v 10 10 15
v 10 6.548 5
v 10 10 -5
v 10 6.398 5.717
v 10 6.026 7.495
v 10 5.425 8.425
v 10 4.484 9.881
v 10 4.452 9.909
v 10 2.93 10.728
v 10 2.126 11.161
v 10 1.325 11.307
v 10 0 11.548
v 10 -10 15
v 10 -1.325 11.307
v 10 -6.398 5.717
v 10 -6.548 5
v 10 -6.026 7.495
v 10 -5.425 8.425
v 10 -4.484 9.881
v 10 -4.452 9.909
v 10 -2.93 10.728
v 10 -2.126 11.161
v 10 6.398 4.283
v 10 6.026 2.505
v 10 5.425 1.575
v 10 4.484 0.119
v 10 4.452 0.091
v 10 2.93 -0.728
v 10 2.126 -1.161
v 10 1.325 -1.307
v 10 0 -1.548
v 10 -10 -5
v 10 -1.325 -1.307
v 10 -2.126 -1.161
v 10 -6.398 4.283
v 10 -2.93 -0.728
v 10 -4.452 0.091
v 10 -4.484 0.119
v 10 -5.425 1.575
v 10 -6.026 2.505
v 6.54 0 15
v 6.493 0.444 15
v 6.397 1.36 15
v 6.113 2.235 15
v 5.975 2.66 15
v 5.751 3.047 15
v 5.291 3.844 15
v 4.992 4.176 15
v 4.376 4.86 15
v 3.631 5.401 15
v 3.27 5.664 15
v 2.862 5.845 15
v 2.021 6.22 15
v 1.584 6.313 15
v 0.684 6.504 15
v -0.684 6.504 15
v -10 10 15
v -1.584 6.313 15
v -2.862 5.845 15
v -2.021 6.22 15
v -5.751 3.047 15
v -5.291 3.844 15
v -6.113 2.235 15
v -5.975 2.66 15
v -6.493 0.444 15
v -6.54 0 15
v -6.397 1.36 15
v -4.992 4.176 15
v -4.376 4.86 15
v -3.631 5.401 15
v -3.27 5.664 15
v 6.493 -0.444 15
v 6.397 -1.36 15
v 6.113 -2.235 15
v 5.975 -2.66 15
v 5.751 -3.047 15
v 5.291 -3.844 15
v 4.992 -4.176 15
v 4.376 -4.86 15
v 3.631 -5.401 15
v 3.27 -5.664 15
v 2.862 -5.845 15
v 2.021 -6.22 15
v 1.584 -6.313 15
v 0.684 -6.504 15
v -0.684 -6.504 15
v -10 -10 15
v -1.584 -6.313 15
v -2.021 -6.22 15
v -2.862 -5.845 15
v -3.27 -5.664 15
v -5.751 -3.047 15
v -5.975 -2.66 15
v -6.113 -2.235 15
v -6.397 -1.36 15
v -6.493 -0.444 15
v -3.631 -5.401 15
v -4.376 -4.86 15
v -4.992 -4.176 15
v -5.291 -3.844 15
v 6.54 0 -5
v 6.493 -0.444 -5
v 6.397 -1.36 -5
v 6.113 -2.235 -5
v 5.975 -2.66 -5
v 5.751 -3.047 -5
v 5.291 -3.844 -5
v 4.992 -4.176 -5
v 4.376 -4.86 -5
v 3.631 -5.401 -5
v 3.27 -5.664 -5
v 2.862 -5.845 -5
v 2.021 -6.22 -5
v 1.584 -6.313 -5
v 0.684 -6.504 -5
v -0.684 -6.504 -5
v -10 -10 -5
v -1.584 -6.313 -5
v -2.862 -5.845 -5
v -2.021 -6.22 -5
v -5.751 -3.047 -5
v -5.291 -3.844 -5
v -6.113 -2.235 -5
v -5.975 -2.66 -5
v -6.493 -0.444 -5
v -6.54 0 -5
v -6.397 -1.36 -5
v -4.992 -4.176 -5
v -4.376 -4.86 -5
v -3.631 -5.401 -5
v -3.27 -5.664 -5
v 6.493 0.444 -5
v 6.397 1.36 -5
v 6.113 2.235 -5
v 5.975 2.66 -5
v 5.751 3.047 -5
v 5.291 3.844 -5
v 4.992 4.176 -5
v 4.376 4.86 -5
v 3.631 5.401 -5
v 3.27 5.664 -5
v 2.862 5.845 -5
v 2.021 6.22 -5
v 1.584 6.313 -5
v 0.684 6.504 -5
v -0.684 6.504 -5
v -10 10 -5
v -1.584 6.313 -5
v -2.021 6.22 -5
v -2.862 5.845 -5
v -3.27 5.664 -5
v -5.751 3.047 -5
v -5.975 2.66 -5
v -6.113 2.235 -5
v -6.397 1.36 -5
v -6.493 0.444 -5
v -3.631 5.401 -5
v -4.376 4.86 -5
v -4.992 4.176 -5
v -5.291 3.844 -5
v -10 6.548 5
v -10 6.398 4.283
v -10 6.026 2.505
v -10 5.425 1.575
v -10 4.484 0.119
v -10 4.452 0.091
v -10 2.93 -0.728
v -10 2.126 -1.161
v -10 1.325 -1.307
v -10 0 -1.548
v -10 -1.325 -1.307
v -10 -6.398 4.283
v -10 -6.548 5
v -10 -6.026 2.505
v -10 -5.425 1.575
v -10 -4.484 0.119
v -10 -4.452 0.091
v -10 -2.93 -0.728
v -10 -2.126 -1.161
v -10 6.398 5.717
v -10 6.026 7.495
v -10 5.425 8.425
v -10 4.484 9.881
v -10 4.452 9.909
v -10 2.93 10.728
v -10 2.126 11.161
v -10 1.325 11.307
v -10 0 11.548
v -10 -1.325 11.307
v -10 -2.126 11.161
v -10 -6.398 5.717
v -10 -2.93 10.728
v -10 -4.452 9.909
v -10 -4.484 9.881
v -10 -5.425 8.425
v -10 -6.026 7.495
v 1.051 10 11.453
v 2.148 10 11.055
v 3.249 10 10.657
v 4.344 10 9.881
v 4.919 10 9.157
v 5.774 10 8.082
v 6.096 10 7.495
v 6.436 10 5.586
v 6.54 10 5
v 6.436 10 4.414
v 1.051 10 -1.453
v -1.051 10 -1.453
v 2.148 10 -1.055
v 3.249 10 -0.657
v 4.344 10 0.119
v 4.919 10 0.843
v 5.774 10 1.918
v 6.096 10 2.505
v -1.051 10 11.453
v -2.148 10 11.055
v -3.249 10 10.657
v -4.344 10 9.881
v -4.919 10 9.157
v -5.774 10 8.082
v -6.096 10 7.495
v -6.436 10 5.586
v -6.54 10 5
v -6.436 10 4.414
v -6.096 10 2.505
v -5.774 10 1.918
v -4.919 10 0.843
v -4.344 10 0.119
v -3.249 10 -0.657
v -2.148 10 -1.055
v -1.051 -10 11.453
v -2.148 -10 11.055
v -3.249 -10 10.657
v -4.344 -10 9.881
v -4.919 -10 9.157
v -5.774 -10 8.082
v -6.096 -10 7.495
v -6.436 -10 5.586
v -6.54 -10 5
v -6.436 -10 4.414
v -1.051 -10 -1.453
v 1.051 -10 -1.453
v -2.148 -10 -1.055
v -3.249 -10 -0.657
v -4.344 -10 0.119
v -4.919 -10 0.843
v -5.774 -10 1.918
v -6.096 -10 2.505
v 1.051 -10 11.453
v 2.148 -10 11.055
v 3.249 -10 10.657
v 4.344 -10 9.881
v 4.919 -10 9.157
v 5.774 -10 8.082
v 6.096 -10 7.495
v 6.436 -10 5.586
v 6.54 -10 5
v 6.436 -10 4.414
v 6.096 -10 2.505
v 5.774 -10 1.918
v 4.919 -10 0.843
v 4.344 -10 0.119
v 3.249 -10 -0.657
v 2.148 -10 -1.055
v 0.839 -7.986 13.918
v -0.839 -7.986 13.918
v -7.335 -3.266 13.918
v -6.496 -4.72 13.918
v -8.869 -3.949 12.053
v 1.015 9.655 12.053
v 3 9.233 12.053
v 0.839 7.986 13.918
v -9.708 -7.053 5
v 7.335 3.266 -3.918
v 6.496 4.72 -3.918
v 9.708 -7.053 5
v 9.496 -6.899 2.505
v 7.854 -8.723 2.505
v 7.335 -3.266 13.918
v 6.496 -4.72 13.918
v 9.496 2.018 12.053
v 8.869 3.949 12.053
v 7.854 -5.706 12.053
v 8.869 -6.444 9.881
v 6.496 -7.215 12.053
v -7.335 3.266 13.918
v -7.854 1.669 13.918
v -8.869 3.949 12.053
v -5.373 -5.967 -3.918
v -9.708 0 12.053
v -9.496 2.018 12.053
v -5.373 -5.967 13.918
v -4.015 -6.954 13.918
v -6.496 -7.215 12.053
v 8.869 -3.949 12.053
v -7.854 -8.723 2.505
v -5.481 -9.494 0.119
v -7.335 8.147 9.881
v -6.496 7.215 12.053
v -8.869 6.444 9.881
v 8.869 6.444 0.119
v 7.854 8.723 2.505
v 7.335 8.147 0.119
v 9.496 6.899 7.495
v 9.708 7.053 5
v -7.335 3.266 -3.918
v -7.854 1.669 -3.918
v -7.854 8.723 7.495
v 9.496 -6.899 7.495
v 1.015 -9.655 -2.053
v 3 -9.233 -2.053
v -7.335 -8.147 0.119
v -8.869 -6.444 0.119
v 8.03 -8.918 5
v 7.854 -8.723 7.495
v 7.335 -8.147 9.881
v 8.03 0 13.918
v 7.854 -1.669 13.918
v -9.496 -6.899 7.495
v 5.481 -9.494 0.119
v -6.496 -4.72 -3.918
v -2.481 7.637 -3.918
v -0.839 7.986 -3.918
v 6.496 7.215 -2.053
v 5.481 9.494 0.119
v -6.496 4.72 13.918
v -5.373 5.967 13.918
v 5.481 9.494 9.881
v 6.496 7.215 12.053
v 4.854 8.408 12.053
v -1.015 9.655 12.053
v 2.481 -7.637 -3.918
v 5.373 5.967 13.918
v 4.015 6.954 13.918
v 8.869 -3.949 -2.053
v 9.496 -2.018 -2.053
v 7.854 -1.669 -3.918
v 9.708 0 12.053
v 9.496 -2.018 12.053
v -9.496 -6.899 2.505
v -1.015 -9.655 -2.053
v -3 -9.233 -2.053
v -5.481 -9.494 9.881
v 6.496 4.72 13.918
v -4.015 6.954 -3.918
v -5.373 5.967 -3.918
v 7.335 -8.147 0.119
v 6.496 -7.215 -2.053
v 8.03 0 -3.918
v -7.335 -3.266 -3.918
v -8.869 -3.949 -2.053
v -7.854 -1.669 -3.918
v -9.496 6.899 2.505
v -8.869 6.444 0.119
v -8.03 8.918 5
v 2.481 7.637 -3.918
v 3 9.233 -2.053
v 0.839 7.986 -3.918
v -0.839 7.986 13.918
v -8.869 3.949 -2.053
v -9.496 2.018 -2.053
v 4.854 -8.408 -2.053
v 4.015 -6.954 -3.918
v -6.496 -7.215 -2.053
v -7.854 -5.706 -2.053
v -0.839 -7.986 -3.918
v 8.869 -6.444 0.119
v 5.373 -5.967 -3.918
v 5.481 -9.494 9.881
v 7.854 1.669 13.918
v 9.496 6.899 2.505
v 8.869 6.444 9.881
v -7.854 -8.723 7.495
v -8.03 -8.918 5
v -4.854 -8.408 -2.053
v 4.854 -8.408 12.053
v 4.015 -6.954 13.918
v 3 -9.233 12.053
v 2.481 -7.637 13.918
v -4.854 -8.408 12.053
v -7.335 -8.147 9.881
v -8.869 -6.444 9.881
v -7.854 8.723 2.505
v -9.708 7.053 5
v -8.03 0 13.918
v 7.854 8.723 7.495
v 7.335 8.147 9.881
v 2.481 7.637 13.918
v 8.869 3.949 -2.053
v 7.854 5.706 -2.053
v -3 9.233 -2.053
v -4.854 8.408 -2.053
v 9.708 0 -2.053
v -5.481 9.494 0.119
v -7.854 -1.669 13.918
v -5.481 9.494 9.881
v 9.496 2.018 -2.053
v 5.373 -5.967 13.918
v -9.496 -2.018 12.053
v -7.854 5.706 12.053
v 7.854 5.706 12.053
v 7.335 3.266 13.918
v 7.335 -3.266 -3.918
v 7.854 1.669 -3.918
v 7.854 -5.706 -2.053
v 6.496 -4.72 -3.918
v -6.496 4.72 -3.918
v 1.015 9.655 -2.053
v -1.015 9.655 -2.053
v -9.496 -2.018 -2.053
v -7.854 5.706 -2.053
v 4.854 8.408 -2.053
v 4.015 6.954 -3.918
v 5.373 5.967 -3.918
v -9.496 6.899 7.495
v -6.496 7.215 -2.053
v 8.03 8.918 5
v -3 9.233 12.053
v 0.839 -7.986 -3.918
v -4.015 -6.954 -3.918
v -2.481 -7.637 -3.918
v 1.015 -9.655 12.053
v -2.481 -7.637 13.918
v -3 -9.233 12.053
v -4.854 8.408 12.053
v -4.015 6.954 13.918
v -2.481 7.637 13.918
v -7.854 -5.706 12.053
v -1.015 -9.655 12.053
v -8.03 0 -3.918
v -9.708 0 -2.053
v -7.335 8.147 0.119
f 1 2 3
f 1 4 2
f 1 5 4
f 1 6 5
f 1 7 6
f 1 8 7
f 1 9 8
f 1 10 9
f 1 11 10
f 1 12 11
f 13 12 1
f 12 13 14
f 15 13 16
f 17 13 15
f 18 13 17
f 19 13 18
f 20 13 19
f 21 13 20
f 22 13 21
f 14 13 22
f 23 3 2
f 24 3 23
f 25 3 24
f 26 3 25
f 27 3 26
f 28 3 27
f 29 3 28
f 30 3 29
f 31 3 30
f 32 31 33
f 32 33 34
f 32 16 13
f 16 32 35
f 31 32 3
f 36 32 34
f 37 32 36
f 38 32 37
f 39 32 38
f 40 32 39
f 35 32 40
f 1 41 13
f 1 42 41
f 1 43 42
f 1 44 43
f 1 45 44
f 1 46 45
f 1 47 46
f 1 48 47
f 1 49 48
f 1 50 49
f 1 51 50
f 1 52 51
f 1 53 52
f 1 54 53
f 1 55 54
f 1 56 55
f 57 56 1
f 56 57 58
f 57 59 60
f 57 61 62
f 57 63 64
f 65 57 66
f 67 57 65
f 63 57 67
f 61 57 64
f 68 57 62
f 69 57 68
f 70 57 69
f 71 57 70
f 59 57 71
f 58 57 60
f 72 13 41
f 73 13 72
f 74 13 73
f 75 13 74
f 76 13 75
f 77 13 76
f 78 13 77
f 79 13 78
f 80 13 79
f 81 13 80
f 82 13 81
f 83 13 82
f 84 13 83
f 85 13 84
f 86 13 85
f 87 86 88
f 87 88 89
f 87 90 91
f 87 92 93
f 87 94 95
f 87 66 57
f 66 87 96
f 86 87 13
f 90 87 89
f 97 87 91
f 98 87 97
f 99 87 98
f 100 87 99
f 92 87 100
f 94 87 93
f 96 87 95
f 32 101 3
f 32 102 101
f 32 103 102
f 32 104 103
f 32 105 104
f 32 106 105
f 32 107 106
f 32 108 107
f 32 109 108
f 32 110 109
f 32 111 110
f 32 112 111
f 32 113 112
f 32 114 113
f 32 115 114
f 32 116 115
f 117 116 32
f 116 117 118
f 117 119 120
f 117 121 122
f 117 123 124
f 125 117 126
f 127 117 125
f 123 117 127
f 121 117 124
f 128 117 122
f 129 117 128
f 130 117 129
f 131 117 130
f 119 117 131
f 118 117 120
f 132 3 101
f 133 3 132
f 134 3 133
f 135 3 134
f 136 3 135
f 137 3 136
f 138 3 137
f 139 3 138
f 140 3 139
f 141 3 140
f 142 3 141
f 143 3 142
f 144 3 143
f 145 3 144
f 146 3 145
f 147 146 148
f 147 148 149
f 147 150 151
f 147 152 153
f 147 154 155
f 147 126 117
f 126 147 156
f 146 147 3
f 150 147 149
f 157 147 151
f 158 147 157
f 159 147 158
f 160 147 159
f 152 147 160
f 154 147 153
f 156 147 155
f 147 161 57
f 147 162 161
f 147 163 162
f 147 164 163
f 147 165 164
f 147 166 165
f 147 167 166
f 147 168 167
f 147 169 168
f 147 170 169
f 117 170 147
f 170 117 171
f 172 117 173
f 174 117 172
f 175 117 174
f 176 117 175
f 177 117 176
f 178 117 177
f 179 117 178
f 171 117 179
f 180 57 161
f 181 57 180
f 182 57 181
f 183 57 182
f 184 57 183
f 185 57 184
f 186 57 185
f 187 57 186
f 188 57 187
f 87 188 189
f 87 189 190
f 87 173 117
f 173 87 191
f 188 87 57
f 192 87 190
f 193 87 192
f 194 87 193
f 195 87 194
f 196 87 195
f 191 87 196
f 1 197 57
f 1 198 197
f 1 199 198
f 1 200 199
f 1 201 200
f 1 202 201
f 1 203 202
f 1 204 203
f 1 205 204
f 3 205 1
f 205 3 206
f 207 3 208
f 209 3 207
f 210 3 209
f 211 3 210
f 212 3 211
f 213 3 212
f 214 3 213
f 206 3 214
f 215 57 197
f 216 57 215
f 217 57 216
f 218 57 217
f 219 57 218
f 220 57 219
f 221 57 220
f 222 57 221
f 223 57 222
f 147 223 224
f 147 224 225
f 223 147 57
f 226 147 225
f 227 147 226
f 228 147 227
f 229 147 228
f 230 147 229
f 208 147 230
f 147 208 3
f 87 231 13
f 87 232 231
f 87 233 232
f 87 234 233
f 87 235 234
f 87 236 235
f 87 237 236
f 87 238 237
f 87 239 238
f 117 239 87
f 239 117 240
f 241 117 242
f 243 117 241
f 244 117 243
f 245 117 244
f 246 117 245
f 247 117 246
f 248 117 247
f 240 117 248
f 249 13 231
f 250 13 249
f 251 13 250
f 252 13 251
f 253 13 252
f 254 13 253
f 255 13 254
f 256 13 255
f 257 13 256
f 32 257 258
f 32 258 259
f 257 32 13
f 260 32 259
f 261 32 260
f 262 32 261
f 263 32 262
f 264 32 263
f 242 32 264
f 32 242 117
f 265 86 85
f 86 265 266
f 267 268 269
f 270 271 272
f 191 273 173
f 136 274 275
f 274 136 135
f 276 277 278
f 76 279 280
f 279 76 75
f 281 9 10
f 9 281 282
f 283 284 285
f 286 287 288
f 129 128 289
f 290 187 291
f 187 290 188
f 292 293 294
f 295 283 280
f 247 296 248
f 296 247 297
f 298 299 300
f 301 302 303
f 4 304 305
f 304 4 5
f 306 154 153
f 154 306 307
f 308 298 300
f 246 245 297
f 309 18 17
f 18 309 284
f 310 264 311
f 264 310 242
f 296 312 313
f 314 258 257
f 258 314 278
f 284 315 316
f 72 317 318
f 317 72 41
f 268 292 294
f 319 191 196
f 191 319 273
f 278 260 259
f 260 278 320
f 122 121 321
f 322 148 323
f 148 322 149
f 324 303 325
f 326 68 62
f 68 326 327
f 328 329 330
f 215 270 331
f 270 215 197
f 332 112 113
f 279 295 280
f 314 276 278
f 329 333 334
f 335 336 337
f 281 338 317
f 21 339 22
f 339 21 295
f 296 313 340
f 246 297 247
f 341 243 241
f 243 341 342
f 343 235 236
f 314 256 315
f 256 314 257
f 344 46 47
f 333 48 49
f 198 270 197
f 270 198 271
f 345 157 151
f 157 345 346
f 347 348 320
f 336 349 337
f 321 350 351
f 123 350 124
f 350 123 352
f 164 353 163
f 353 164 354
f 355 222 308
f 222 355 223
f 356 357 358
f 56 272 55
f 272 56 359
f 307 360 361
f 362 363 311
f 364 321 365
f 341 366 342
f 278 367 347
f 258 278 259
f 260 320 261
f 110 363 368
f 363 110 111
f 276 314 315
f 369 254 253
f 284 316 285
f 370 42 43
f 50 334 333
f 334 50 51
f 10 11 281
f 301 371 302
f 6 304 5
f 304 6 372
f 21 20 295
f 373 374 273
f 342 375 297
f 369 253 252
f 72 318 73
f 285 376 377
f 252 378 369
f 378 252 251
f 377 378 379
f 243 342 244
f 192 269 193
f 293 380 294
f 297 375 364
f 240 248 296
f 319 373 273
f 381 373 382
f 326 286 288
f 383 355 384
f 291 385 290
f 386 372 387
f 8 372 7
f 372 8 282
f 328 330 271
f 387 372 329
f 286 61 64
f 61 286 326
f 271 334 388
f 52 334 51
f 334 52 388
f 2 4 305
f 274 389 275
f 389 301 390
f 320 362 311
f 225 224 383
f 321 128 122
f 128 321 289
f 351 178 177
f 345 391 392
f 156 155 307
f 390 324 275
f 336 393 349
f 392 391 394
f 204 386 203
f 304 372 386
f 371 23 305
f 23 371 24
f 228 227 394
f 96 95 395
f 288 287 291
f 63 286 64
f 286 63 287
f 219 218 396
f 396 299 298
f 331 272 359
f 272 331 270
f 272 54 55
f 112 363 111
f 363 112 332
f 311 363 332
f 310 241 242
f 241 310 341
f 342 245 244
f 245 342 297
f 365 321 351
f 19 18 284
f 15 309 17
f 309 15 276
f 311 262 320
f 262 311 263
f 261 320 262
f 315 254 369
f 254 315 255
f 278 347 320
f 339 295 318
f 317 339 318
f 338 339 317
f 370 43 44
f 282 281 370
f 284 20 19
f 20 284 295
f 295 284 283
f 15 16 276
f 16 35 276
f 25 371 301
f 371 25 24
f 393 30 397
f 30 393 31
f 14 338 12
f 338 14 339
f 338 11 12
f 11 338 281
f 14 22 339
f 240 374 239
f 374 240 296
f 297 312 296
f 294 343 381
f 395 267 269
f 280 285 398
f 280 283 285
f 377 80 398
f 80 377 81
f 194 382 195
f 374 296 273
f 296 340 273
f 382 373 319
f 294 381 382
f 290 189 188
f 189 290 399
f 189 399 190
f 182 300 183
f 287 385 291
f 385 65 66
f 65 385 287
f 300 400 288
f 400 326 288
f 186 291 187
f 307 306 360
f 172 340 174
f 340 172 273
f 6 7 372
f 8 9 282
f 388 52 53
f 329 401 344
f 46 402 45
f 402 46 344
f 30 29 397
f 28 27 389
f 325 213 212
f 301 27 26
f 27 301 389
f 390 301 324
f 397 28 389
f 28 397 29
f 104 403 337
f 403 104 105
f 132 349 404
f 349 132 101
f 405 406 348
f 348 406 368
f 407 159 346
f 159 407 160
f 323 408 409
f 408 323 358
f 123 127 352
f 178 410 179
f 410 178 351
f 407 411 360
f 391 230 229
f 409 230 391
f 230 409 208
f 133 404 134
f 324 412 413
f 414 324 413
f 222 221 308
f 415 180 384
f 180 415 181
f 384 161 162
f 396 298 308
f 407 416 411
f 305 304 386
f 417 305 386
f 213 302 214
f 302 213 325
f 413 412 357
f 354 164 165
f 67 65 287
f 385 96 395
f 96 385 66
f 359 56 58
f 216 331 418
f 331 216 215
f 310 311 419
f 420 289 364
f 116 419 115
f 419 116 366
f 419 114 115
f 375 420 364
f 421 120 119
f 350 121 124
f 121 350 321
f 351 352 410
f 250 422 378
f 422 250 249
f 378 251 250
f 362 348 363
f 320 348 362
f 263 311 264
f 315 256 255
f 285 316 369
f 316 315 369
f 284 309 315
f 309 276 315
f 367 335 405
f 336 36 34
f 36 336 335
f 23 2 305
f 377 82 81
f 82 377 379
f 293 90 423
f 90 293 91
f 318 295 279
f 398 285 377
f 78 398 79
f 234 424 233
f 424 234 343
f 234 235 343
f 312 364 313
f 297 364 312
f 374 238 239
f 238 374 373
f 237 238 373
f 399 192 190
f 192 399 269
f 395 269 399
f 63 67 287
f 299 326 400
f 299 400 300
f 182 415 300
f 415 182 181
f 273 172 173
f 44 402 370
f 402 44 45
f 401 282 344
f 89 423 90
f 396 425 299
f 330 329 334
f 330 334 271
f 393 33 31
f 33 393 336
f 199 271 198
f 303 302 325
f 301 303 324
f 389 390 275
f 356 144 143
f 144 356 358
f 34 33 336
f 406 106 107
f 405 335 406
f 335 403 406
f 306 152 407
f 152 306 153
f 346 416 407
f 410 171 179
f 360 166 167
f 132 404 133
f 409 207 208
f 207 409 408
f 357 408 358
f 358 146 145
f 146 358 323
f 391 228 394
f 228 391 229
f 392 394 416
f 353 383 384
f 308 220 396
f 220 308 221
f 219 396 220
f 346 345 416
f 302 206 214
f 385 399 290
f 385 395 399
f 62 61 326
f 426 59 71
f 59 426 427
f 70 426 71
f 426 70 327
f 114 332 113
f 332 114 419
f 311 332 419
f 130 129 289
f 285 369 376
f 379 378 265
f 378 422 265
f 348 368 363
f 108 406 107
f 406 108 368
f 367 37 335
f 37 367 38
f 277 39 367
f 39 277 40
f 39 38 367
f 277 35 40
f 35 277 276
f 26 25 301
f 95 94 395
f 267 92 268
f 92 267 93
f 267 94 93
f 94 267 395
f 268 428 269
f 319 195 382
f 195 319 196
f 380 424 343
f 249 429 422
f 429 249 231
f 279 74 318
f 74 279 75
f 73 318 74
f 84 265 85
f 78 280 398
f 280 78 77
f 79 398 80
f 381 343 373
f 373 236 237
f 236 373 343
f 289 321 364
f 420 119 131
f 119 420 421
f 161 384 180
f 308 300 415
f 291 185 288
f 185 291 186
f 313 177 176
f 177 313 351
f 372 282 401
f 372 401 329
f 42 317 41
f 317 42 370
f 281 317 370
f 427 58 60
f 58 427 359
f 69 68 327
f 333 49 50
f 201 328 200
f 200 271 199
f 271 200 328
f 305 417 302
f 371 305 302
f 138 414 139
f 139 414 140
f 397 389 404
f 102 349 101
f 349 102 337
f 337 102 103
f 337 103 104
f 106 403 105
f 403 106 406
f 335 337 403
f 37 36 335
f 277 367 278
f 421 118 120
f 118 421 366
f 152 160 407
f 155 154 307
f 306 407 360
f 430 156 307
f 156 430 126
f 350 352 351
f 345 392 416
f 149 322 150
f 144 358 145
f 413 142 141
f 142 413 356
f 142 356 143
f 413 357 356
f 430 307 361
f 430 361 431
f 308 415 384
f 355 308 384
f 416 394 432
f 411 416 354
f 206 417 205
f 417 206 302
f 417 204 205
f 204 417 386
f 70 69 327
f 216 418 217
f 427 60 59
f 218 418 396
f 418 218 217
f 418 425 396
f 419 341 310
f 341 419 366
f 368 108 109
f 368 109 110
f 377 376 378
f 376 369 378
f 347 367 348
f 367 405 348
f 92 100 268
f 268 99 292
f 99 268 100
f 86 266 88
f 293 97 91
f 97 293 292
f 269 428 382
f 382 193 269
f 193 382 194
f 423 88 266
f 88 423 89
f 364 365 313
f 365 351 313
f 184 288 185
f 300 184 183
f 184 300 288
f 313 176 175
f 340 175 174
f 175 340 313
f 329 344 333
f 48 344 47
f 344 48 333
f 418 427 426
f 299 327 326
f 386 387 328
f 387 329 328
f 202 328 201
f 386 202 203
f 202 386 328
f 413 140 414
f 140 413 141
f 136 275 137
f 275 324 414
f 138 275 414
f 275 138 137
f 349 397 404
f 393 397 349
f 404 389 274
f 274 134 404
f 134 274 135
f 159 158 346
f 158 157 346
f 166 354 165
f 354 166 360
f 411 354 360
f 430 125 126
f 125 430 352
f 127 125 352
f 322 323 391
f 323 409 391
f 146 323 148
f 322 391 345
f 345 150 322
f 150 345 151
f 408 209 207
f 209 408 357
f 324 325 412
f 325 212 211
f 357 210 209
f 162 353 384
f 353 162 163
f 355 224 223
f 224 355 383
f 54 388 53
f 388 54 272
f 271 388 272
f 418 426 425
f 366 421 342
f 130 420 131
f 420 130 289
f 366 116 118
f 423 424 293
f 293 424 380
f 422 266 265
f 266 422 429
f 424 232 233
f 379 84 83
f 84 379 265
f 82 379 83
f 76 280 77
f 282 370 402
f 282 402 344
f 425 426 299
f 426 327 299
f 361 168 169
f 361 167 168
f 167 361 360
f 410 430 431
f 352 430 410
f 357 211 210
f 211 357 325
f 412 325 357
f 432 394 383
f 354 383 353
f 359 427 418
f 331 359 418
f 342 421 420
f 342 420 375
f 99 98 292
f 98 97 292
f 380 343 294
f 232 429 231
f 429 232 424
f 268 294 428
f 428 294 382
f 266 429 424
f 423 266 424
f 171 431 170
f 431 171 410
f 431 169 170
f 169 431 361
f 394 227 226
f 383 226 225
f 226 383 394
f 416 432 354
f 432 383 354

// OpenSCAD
translate([0, 0, 5]) difference() {
    cube([20, 20, 20], center = true);
    sphere(r = 12);
}
